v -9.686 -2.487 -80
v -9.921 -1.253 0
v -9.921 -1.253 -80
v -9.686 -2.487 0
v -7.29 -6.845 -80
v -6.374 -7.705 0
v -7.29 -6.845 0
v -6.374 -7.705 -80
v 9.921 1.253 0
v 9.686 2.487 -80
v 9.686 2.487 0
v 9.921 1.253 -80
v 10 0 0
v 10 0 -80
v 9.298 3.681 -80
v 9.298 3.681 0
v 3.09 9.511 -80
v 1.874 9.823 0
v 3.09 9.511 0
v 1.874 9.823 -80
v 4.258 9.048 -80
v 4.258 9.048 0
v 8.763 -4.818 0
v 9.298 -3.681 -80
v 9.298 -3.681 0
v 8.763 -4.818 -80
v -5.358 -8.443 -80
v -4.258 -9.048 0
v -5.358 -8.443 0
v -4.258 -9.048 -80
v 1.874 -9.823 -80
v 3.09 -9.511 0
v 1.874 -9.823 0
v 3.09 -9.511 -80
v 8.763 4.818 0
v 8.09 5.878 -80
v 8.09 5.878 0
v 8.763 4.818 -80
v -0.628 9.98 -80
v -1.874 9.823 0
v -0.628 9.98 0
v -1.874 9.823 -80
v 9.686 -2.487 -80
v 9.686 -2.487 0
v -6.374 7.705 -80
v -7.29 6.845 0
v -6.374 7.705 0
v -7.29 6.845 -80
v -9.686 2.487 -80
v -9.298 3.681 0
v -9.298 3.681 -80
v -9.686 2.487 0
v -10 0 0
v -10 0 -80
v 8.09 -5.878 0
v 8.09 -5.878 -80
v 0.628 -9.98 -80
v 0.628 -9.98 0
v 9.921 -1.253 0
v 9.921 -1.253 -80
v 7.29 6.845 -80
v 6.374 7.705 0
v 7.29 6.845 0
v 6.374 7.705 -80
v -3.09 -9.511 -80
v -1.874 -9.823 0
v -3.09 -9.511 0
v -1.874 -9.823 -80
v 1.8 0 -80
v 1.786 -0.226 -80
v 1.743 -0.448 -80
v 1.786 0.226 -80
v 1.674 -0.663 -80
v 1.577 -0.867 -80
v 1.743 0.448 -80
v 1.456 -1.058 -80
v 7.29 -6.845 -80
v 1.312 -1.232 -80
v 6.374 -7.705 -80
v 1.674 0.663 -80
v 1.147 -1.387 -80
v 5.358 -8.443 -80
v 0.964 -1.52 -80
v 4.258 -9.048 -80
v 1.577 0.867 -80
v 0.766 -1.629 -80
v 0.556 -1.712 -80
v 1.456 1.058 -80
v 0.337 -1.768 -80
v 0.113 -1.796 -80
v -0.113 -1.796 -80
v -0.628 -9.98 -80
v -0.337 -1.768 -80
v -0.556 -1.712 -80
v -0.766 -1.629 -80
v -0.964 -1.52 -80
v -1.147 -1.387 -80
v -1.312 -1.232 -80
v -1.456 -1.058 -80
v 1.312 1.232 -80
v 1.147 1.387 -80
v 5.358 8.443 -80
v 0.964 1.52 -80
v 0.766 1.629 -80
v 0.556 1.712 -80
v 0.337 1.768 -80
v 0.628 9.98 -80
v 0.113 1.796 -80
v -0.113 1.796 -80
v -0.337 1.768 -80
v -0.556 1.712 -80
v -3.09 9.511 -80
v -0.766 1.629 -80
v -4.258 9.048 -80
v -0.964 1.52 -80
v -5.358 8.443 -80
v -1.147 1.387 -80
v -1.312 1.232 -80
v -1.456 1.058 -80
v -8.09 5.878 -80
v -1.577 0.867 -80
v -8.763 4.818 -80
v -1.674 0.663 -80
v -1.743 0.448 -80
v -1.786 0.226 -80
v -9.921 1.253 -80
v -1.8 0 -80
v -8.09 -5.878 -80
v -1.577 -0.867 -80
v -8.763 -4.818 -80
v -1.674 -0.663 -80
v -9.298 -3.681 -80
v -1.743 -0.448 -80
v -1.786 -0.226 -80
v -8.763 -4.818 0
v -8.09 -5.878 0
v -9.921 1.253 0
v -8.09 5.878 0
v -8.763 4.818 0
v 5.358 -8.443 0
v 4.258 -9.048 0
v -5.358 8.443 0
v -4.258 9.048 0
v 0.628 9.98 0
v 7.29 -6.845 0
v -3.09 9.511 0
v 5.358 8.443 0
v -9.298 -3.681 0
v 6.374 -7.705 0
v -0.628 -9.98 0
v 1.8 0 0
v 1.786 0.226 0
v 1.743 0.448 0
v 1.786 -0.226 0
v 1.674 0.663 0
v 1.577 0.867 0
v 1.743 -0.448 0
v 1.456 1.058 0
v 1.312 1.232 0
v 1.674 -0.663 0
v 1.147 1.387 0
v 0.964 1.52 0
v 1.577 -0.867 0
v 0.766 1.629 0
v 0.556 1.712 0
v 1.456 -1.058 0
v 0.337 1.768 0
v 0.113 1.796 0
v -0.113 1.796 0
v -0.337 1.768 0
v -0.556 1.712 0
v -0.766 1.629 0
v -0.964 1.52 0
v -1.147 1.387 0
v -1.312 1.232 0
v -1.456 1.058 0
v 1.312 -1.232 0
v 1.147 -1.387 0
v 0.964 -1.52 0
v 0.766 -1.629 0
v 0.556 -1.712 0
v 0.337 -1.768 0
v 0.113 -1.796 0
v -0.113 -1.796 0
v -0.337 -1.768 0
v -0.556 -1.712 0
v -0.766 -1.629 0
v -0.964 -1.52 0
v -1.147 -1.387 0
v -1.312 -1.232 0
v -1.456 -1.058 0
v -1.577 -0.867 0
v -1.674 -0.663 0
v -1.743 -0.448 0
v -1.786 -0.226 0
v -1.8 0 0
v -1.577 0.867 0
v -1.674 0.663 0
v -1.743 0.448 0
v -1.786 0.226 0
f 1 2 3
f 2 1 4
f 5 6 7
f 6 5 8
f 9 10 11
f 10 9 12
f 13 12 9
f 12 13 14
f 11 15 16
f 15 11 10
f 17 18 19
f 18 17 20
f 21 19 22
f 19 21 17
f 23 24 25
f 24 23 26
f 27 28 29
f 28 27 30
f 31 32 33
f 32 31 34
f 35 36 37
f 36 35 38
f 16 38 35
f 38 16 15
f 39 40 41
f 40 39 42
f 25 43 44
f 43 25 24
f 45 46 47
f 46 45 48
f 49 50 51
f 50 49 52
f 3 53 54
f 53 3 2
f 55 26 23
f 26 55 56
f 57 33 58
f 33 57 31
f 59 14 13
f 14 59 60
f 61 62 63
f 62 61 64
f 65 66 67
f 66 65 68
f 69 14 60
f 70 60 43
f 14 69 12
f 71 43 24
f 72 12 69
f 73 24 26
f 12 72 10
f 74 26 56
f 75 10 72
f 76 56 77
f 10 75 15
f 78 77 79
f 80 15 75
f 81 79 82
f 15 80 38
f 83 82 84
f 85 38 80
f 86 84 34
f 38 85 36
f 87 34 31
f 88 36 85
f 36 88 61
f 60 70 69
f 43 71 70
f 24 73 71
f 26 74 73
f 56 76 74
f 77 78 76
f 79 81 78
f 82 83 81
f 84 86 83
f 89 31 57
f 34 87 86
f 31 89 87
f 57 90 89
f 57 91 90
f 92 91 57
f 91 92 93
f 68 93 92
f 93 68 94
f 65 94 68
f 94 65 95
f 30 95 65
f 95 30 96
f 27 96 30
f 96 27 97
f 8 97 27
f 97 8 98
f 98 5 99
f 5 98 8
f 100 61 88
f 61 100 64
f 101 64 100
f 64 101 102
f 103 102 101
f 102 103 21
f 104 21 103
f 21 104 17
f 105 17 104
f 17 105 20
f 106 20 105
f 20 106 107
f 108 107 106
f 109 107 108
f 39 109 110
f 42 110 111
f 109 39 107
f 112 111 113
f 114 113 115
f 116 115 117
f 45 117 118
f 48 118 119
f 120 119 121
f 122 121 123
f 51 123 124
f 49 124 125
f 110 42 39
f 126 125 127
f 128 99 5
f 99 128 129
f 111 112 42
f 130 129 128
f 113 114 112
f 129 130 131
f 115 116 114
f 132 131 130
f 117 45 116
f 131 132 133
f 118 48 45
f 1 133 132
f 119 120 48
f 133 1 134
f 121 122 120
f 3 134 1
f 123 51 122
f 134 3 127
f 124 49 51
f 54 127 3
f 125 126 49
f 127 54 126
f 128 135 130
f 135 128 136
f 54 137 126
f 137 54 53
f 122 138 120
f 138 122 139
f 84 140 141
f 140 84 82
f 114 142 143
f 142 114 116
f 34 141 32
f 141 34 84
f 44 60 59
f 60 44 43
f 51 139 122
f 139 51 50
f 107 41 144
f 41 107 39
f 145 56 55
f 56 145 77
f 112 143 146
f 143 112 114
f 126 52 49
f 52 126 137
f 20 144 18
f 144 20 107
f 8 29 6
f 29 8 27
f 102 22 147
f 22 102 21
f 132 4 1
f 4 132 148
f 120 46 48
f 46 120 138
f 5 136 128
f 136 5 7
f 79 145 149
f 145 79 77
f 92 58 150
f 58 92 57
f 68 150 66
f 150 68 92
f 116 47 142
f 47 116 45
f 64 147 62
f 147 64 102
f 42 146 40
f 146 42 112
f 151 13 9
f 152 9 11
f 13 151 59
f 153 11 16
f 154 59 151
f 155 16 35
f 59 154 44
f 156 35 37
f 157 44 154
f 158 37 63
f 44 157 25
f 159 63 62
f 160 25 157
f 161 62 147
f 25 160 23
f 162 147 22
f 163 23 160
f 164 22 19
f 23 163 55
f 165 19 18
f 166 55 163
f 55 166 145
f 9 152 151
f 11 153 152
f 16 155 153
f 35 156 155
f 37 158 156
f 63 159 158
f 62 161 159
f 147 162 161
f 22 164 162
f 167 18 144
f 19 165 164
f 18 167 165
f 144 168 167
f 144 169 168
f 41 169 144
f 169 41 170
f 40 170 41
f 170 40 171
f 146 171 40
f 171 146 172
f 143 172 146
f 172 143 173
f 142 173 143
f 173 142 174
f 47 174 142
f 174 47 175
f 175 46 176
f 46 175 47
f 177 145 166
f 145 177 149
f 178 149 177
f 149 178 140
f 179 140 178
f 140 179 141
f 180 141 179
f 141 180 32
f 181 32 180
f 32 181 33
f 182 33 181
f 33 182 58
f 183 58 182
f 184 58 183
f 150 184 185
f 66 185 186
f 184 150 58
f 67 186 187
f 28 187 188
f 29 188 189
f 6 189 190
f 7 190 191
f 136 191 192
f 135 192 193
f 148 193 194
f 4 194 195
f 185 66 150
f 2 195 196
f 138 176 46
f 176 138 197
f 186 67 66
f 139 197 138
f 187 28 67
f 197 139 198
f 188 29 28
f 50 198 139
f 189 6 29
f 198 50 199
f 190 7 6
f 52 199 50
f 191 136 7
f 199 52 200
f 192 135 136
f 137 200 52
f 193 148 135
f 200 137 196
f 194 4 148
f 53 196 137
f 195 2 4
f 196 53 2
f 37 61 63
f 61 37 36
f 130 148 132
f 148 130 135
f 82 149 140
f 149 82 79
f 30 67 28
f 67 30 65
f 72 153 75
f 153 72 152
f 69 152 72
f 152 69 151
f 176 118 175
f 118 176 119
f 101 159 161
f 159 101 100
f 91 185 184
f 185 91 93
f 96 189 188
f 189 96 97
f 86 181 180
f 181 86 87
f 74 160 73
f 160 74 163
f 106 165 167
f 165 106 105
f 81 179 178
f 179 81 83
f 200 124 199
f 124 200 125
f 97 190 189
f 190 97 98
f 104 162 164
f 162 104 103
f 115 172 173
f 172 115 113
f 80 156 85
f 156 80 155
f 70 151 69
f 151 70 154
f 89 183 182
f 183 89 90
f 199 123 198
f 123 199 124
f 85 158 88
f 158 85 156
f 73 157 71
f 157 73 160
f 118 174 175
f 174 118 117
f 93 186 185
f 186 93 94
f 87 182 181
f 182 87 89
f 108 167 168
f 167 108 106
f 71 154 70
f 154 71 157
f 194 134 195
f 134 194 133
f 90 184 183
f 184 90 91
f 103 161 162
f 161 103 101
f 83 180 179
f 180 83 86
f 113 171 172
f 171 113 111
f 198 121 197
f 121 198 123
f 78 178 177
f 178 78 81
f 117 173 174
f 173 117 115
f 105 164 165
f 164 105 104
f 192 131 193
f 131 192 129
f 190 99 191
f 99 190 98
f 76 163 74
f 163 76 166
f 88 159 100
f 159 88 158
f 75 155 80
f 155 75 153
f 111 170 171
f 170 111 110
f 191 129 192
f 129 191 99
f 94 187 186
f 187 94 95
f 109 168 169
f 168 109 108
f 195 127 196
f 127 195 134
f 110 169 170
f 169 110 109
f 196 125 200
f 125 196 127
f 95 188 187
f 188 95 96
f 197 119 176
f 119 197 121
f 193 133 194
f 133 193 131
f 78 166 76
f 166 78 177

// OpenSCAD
$fn = 50;


difference() {
	union() {
		translate(v = [0, 0, -80.0000000000]) {
			cylinder(h = 80, r = 10.0000000000);
		}
		cylinder(h = 0, r = 13.0000000000);
	}
	union() {
		#translate(v = [0, 0, -80]) {
			cylinder(h = 80, r = 1.8000000000);
		}
	}
}
